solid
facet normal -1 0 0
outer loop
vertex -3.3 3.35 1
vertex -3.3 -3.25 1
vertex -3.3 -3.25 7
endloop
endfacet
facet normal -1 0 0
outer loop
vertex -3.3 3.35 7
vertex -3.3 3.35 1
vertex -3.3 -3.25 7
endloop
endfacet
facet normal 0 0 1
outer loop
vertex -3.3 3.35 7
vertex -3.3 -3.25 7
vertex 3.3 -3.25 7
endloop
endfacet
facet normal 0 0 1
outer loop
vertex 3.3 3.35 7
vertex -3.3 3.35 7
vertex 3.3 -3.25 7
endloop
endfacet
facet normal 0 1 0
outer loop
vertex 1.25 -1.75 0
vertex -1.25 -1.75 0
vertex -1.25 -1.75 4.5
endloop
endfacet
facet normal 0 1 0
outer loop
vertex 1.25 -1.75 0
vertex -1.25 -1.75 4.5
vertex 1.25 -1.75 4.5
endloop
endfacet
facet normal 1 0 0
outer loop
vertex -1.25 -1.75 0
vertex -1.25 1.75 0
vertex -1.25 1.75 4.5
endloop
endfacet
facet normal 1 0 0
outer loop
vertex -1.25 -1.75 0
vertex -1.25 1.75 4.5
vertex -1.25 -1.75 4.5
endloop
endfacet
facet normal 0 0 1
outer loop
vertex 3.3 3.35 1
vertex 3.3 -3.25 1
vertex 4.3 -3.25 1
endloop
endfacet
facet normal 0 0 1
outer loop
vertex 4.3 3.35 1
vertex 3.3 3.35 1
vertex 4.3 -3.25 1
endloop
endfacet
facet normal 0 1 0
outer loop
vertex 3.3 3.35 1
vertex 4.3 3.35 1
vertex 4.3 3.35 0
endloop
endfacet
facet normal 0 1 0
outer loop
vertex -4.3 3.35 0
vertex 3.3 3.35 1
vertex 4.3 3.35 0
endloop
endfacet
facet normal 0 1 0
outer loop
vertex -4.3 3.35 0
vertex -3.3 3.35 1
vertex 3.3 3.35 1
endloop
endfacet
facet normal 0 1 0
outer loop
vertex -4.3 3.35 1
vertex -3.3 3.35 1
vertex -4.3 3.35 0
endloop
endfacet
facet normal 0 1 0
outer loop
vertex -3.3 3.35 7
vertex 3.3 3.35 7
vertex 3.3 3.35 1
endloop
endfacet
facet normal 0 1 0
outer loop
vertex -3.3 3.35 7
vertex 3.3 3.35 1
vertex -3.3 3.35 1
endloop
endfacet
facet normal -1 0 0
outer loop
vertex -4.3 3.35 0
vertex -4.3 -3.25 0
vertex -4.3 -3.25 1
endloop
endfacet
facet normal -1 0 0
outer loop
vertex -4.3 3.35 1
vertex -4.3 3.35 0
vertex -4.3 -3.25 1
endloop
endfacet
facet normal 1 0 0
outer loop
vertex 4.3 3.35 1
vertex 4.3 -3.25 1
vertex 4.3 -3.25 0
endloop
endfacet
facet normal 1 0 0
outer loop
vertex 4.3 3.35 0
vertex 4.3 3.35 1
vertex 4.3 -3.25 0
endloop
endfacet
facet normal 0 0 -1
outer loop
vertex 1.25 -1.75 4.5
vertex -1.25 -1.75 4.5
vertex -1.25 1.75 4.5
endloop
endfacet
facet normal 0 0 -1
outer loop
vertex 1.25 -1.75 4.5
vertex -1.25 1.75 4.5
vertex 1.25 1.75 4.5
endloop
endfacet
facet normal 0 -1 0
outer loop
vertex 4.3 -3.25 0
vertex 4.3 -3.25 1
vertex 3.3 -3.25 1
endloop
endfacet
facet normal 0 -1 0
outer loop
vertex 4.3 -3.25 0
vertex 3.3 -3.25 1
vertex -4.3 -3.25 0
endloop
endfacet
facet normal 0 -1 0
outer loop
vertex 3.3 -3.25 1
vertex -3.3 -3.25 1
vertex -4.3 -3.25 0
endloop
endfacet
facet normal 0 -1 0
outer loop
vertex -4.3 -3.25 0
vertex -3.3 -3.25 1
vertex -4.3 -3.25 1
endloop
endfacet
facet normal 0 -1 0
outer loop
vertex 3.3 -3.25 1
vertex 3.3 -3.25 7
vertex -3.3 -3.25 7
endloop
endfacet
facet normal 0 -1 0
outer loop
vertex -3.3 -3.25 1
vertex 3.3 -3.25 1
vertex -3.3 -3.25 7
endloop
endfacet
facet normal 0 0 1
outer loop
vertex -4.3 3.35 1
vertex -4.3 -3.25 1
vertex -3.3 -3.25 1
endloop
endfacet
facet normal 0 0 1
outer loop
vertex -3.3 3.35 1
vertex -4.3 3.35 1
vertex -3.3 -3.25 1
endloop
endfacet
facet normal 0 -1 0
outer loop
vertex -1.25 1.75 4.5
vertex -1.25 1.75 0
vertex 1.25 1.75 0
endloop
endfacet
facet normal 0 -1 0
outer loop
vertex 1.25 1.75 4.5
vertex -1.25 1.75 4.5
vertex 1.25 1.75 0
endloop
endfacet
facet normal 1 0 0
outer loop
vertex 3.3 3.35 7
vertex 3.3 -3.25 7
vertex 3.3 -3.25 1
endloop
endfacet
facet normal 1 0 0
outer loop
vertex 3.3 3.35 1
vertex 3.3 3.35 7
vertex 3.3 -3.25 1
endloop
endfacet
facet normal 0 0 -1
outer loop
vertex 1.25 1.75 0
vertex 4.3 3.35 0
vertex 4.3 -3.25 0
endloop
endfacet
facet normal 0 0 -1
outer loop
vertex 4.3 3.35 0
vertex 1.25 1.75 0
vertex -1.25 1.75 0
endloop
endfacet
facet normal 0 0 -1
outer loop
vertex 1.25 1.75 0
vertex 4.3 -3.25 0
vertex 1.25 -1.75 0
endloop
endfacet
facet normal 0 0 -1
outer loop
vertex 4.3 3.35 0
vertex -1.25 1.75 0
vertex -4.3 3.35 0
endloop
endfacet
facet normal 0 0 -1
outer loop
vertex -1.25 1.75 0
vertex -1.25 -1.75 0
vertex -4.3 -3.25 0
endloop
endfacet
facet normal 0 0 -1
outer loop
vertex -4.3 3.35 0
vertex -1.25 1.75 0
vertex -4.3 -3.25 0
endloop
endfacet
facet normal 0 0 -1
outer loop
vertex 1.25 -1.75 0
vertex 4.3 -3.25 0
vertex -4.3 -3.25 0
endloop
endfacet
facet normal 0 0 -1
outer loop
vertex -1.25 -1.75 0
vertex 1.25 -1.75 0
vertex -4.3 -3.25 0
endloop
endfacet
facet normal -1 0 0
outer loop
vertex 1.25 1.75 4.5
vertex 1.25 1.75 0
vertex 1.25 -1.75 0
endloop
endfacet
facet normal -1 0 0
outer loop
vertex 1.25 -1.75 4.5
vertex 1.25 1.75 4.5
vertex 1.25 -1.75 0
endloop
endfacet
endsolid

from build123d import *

# Parameters (mm, degrees)
SKETCH014_W      = 2.5
SKETCH014_H      = 3.5
EXTRUDE015_DEPTH = 4.5
EXTRUDE014_DEPTH = 6.6


with BuildPart() as extrude015:
    # Sketch014 → Extrude015 (new body)
    with BuildSketch(Plane(origin=(0, 0, -10), x_dir=(1, 0, 0), z_dir=(0, 0, -1))):
        Rectangle(SKETCH014_W, SKETCH014_H)
    extrude(amount=-EXTRUDE015_DEPTH)


with BuildPart() as extrude015_1:
    # Extrude015 placement: moved
    add(extrude015.part.moved(Location((0, 0, 10))))


with BuildPart() as cut023:
    # Sketch013 → Extrude014 (new body)
    with BuildSketch(Plane.XZ.offset(10)):
        Polygon((-3.3, 7), (3.3, 7), (3.3, 1), (4.3, 1), (4.3, 0), (-4.3, 0), (-4.3, 1), (-3.3, 1), align=None)
    extrude(amount=-EXTRUDE014_DEPTH)


with BuildPart() as cut023_1:
    # Extrude014 placement: moved
    add(cut023.part.moved(Location((0, 6.75, 0))))

    # Cut023: cut Extrude015
    add(extrude015_1.part, mode=Mode.SUBTRACT)


solid = cut023_1.part
